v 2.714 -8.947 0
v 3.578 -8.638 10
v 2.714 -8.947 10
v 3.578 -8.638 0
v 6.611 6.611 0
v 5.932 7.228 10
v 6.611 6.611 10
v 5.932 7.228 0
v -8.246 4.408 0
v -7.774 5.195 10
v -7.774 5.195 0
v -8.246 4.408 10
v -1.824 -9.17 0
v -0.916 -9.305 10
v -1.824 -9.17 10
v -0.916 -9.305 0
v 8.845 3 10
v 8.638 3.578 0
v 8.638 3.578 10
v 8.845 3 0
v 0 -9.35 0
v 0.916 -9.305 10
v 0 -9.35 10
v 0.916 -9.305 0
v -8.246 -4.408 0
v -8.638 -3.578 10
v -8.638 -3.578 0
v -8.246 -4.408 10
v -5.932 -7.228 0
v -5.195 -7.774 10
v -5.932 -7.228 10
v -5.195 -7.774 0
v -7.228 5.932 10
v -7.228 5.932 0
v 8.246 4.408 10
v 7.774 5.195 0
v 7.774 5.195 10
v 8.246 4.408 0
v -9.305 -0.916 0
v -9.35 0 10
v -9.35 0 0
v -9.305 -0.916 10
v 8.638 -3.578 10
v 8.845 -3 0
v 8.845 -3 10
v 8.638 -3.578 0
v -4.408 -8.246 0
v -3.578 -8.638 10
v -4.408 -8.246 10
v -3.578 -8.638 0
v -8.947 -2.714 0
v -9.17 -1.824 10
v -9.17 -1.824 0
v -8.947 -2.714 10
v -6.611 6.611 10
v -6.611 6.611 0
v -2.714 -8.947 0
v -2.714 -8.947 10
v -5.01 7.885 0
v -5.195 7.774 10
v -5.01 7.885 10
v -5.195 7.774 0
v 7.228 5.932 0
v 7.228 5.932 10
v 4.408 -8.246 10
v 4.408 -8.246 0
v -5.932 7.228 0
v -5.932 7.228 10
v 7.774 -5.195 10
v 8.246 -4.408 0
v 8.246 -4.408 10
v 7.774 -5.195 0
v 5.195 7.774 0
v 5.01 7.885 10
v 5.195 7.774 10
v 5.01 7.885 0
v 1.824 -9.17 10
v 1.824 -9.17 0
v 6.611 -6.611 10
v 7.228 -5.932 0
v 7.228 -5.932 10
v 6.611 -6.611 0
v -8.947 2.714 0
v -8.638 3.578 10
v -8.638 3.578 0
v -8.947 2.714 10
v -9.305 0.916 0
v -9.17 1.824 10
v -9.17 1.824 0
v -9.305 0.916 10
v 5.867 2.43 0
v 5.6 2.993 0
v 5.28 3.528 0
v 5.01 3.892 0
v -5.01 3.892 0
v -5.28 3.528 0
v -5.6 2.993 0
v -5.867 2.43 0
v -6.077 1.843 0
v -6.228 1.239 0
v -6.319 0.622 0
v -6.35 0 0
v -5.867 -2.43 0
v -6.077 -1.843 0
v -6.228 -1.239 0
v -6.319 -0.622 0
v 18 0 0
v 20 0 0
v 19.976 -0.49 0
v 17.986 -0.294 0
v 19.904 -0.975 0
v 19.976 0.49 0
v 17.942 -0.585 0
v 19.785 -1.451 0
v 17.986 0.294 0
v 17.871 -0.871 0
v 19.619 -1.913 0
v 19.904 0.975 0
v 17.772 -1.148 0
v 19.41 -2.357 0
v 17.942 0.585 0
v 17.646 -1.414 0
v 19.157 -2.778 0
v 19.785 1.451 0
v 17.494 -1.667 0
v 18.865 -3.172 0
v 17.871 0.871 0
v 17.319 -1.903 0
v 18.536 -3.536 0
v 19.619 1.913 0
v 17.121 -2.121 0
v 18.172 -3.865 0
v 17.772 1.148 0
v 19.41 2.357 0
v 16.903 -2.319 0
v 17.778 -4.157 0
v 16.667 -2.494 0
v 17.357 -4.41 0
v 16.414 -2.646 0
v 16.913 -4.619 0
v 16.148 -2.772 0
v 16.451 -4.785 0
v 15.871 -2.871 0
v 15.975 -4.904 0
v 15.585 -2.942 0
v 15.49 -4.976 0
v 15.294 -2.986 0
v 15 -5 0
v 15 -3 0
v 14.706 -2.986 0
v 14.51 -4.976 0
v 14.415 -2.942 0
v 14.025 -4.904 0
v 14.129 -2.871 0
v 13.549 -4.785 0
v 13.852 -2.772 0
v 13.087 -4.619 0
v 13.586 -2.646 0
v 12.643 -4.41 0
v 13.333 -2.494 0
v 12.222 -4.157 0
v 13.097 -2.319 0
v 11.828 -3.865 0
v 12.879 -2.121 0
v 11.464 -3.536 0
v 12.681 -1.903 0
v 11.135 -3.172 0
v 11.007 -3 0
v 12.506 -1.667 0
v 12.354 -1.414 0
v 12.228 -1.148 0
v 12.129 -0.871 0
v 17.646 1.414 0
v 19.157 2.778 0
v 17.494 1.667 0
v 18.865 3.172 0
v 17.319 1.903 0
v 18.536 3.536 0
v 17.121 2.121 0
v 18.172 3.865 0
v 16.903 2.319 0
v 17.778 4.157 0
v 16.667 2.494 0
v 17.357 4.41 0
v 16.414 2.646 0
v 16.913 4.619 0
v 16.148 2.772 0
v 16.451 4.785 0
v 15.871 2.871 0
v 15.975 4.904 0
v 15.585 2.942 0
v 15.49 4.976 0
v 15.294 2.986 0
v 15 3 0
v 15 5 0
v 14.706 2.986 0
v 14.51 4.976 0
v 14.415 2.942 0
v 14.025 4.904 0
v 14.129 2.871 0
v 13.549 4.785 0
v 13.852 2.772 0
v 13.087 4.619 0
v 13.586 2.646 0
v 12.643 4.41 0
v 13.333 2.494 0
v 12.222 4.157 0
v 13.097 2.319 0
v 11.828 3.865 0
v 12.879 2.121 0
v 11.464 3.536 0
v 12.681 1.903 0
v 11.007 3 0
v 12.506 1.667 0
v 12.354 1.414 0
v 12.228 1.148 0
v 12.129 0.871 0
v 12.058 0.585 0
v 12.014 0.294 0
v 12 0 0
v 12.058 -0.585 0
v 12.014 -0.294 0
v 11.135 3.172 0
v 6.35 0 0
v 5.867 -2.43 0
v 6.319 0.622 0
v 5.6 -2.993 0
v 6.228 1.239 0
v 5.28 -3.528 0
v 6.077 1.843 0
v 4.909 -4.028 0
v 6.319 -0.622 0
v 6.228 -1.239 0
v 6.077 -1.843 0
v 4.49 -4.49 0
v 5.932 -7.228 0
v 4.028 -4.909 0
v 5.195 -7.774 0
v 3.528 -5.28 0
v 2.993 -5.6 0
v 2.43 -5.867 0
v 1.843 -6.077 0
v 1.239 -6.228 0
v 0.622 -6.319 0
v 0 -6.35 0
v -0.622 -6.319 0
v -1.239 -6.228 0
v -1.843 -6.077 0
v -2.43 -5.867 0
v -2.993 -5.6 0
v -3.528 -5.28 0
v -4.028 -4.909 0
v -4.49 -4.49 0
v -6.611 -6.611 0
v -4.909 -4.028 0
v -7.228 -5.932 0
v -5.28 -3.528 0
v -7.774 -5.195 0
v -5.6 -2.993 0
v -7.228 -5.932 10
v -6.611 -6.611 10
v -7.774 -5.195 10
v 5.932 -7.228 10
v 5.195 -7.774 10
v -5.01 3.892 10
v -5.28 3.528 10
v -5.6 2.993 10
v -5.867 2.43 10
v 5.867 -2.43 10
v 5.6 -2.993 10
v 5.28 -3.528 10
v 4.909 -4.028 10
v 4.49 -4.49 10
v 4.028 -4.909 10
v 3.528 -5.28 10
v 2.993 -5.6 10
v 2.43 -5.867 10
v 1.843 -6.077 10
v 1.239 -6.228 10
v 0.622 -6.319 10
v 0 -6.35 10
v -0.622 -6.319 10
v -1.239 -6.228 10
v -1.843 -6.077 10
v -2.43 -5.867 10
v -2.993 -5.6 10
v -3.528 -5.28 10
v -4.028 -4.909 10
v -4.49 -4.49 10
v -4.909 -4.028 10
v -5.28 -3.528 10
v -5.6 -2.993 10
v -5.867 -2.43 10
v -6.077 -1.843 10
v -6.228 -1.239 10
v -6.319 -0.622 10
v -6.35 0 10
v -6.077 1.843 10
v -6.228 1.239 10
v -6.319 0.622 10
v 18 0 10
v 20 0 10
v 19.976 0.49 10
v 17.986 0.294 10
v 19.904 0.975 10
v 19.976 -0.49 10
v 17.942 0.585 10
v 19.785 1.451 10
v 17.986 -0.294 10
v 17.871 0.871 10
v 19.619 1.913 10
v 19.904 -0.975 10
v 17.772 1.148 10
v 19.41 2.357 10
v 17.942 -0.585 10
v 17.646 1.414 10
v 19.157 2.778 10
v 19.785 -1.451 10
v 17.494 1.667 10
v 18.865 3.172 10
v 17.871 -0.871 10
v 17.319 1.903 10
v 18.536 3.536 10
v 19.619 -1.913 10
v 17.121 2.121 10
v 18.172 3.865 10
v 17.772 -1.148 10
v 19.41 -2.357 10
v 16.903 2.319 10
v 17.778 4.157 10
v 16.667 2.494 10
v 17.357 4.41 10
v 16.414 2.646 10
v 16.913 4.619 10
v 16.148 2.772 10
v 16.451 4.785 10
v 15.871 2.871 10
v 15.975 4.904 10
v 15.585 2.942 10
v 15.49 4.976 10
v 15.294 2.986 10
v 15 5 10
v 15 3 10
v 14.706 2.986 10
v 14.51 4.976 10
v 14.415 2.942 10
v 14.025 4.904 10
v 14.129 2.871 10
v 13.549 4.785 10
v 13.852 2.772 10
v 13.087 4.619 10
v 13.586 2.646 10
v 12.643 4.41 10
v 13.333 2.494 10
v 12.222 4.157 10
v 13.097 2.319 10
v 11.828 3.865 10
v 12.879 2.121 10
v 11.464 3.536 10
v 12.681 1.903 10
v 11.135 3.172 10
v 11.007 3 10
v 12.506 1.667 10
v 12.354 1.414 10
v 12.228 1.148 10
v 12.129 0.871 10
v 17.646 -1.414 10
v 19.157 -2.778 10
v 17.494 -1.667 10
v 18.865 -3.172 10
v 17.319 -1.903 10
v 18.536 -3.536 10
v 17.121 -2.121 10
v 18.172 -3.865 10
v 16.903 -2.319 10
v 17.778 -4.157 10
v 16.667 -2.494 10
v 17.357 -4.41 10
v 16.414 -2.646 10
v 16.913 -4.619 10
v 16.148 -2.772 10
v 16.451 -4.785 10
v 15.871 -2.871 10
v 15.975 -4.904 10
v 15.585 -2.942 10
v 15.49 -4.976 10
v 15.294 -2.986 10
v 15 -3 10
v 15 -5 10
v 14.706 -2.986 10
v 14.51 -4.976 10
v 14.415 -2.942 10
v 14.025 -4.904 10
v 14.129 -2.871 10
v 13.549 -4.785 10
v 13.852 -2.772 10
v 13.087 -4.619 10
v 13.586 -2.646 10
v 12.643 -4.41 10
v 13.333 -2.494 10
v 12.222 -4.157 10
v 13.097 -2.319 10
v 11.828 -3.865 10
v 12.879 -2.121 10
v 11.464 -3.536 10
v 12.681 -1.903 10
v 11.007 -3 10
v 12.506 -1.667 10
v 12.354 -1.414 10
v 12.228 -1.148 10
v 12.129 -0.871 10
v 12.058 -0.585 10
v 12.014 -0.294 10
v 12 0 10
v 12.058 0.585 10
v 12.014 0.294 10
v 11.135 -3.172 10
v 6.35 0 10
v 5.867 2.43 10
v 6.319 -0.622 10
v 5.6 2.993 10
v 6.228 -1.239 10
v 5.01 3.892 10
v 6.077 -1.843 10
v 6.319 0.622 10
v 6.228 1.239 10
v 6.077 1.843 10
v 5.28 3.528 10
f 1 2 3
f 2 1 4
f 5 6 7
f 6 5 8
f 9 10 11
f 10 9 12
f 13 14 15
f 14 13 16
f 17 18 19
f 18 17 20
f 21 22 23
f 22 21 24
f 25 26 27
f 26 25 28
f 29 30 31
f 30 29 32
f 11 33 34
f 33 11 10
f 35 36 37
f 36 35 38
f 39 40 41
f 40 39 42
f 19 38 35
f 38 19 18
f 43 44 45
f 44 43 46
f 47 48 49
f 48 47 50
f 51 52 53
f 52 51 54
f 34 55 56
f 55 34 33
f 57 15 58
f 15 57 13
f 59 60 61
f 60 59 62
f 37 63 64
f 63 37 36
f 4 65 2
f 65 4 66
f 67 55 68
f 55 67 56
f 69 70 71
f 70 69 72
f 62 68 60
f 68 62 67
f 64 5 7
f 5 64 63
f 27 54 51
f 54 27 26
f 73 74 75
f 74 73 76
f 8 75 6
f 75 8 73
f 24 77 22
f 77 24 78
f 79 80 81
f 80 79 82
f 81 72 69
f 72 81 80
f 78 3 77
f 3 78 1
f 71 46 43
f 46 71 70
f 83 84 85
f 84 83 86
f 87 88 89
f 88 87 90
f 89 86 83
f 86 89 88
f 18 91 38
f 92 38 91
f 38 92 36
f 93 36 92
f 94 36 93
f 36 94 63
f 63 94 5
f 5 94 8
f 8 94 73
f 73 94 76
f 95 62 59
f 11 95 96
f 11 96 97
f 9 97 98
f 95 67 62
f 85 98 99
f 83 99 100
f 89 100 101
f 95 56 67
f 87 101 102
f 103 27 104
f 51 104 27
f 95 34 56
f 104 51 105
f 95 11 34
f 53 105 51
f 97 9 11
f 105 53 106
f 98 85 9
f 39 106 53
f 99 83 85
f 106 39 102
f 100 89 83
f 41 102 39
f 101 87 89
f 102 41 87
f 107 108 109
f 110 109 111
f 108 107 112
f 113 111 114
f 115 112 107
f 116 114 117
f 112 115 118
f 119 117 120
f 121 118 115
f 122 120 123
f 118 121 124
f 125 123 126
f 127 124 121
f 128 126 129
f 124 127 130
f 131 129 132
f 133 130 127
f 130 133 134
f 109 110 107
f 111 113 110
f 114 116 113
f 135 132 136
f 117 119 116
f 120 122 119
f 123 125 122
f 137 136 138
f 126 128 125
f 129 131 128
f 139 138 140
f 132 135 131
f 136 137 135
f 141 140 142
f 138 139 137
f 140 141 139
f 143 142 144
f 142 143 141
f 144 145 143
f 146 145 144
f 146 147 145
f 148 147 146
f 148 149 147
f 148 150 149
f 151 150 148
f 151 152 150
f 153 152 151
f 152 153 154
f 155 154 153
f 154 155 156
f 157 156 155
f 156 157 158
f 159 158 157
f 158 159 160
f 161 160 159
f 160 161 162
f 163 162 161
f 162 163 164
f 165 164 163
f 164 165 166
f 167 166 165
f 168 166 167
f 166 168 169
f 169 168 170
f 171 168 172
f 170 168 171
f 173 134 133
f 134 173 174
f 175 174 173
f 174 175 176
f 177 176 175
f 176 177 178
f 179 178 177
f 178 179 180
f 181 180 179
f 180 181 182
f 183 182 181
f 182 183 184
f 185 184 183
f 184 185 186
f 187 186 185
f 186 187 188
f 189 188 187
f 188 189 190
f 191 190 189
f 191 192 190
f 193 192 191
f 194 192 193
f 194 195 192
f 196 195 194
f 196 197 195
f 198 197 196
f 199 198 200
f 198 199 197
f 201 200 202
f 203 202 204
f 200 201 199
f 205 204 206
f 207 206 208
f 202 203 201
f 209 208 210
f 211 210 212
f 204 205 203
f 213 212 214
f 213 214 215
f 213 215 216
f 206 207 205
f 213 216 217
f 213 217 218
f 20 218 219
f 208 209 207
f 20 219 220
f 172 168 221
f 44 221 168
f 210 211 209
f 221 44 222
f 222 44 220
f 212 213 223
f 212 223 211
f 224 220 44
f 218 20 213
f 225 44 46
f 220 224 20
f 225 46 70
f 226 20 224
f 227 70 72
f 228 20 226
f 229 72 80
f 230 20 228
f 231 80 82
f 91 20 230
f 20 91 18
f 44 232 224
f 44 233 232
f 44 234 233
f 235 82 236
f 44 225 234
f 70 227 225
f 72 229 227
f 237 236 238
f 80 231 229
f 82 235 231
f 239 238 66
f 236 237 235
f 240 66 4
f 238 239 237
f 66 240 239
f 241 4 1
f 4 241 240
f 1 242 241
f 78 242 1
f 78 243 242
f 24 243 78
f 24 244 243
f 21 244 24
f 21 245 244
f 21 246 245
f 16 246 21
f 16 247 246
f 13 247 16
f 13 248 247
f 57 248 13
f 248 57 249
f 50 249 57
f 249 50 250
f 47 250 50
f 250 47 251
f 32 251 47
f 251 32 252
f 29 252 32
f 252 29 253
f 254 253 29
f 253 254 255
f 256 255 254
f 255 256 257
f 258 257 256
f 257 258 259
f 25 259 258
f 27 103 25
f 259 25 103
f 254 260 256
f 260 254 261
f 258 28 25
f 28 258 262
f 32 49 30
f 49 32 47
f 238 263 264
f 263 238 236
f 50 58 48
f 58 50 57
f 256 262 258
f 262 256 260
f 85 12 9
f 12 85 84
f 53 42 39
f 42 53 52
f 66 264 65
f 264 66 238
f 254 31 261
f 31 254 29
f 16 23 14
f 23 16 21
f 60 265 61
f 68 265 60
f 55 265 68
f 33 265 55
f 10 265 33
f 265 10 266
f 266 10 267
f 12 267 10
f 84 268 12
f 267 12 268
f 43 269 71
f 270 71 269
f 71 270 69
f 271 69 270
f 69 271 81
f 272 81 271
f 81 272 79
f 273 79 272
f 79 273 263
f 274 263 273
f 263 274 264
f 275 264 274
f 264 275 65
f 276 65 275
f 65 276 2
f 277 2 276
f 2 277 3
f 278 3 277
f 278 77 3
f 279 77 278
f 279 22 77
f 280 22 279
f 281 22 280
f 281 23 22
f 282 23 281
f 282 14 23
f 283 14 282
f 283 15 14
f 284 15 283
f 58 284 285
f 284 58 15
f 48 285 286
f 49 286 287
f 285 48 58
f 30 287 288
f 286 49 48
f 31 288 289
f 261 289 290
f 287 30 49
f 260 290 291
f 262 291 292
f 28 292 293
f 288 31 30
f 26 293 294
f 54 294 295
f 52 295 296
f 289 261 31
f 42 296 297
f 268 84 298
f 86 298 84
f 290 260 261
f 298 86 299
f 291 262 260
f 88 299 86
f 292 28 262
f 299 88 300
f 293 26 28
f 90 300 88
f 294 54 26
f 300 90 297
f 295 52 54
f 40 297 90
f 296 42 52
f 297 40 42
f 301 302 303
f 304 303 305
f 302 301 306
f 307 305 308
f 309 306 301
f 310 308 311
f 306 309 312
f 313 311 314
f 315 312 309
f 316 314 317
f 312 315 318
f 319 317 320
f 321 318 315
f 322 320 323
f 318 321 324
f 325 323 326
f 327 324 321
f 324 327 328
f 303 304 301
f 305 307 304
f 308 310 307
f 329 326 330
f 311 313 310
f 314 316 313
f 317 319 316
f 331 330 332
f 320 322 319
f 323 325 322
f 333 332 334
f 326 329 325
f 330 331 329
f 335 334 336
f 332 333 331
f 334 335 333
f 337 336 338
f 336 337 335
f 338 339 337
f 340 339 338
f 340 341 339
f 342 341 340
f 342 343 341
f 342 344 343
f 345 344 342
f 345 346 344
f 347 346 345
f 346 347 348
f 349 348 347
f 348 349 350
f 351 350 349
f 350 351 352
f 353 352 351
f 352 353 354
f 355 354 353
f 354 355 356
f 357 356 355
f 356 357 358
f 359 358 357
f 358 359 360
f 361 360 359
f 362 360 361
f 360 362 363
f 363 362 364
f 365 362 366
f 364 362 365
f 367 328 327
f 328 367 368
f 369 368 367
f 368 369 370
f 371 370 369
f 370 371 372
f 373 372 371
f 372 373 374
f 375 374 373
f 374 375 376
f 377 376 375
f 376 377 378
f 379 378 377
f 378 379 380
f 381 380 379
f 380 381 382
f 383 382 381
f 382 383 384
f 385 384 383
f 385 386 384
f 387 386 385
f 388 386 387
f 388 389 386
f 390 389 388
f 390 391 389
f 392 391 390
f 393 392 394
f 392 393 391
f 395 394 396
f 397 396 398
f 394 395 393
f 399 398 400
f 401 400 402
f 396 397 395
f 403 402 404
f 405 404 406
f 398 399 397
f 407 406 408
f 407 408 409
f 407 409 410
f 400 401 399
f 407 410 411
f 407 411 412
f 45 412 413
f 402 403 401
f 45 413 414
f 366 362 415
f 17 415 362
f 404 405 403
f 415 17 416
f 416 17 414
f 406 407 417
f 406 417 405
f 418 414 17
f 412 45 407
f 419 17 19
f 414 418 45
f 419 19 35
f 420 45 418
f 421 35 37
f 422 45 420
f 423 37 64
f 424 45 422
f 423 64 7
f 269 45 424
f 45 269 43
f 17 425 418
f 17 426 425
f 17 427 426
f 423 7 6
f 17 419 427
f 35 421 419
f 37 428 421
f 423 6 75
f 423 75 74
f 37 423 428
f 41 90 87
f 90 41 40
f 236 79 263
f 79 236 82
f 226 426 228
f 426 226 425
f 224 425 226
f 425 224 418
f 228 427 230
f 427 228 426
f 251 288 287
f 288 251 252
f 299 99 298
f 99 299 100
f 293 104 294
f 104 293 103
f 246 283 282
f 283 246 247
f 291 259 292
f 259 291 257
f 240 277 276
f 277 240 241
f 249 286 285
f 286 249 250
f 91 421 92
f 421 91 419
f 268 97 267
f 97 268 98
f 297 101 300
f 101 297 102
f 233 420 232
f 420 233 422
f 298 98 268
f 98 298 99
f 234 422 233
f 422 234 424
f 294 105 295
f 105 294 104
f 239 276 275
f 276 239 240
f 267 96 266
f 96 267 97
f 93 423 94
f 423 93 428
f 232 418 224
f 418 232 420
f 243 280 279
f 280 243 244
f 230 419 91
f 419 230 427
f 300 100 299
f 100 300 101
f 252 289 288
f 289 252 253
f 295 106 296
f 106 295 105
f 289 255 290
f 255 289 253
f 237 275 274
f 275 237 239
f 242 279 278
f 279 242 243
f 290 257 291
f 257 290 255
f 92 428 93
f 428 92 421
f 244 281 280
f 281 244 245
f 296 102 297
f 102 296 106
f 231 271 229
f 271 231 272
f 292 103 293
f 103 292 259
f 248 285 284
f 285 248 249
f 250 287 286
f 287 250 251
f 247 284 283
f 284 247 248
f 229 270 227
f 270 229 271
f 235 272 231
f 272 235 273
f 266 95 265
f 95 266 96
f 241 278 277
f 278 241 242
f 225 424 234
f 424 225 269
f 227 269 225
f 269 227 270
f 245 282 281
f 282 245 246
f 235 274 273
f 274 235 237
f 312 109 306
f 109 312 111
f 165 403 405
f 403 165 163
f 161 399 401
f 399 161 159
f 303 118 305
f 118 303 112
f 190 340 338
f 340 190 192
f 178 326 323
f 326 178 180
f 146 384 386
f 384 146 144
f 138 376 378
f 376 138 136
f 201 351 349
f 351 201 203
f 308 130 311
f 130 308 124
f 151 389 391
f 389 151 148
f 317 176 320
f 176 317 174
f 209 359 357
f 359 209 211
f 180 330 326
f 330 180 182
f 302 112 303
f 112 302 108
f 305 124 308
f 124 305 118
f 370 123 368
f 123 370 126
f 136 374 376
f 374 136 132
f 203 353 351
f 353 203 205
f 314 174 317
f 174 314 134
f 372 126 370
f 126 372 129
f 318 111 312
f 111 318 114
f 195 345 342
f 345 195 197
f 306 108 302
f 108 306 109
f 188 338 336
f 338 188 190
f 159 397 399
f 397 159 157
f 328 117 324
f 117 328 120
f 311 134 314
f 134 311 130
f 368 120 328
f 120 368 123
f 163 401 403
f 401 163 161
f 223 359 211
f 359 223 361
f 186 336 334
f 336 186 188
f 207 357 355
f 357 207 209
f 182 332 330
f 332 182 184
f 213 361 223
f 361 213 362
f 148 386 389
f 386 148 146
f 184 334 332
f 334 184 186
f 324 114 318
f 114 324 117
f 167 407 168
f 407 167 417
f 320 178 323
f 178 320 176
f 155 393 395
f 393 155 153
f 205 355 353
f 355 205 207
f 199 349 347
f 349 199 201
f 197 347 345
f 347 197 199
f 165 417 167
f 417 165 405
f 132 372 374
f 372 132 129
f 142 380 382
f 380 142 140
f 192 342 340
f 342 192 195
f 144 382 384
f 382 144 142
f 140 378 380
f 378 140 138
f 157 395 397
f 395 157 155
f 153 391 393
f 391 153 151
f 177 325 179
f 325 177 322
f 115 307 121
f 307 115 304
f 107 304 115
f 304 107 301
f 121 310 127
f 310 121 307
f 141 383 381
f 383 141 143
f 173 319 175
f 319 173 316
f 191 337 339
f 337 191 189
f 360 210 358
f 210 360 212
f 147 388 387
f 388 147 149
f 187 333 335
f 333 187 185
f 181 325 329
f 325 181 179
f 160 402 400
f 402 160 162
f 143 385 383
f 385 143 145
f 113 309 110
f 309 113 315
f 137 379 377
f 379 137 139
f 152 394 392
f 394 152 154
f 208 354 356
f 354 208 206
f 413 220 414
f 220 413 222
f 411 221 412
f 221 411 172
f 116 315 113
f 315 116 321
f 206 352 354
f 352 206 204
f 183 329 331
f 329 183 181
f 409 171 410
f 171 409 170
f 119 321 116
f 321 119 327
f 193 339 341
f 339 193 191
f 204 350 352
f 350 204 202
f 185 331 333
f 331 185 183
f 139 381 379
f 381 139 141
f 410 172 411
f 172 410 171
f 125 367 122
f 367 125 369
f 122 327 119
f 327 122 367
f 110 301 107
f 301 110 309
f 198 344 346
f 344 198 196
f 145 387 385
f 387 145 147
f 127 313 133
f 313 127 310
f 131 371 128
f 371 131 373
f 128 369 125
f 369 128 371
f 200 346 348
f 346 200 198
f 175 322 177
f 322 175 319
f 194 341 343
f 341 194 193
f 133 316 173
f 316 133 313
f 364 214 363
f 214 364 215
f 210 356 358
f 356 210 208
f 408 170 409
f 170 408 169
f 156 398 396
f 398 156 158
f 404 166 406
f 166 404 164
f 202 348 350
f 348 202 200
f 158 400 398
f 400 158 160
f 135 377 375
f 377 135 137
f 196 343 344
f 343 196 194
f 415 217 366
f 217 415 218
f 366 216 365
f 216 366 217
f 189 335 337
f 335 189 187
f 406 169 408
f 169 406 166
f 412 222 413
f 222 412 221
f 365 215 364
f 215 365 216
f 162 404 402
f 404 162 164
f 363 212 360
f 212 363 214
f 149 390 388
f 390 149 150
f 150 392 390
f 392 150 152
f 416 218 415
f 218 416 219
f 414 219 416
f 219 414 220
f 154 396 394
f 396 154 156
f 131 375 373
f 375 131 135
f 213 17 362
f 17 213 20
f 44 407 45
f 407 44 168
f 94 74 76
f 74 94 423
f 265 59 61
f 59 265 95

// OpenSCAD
// --- Dimensions ---
// Rod inner diameter (1/2 inch lab stand)
rod_id = 12.7;
// Rod ring wall thickness
rod_wall = 3;
// Rod ring outer diameter
rod_od = rod_id + 2 * rod_wall; // 18.7

// Tubing inner diameter
tube_id = 6;
// Tubing ring wall thickness
tube_wall = 2;
// Tubing ring outer diameter
tube_od = tube_id + 2 * tube_wall; // 10

// Tubing ring center position
tube_cx = 15;
tube_cy = 0;

// Bridge width (Y direction)
bridge_width = 6;
// Bridge X range
bridge_x1 = 8;
bridge_x2 = 12;

// Extrusion height (Z)
height = 10;

// --- Snap-on clip ---
difference() {
    union() {
        // Rod ring
        difference() {
            cylinder(d = rod_od, h = height, $fn = 64);
            cylinder(d = rod_id, h = height + 0.01, $fn = 64);
        }
        
        // Tubing ring
        translate([tube_cx, tube_cy, 0]) {
            difference() {
                cylinder(d = tube_od, h = height, $fn = 64);
                cylinder(d = tube_id, h = height + 0.01, $fn = 64);
            }
        }
        
        // Bridge
        translate([bridge_x1, -bridge_width/2, 0]) {
            cube([bridge_x2 - bridge_x1, bridge_width, height]);
        }
    }
    
    // Cut out rod ring opening (-X side)
    translate([-5.01, 0, -0.01]) {
        cube([10.02, 10.02, height + 0.02]);
    }
    
    // Cut out tubing ring opening (+X side)
    translate([tube_cx + 15.01, -2.26, -0.01]) {
        cube([10.02, 4.52, height + 0.02]);
    }
}
